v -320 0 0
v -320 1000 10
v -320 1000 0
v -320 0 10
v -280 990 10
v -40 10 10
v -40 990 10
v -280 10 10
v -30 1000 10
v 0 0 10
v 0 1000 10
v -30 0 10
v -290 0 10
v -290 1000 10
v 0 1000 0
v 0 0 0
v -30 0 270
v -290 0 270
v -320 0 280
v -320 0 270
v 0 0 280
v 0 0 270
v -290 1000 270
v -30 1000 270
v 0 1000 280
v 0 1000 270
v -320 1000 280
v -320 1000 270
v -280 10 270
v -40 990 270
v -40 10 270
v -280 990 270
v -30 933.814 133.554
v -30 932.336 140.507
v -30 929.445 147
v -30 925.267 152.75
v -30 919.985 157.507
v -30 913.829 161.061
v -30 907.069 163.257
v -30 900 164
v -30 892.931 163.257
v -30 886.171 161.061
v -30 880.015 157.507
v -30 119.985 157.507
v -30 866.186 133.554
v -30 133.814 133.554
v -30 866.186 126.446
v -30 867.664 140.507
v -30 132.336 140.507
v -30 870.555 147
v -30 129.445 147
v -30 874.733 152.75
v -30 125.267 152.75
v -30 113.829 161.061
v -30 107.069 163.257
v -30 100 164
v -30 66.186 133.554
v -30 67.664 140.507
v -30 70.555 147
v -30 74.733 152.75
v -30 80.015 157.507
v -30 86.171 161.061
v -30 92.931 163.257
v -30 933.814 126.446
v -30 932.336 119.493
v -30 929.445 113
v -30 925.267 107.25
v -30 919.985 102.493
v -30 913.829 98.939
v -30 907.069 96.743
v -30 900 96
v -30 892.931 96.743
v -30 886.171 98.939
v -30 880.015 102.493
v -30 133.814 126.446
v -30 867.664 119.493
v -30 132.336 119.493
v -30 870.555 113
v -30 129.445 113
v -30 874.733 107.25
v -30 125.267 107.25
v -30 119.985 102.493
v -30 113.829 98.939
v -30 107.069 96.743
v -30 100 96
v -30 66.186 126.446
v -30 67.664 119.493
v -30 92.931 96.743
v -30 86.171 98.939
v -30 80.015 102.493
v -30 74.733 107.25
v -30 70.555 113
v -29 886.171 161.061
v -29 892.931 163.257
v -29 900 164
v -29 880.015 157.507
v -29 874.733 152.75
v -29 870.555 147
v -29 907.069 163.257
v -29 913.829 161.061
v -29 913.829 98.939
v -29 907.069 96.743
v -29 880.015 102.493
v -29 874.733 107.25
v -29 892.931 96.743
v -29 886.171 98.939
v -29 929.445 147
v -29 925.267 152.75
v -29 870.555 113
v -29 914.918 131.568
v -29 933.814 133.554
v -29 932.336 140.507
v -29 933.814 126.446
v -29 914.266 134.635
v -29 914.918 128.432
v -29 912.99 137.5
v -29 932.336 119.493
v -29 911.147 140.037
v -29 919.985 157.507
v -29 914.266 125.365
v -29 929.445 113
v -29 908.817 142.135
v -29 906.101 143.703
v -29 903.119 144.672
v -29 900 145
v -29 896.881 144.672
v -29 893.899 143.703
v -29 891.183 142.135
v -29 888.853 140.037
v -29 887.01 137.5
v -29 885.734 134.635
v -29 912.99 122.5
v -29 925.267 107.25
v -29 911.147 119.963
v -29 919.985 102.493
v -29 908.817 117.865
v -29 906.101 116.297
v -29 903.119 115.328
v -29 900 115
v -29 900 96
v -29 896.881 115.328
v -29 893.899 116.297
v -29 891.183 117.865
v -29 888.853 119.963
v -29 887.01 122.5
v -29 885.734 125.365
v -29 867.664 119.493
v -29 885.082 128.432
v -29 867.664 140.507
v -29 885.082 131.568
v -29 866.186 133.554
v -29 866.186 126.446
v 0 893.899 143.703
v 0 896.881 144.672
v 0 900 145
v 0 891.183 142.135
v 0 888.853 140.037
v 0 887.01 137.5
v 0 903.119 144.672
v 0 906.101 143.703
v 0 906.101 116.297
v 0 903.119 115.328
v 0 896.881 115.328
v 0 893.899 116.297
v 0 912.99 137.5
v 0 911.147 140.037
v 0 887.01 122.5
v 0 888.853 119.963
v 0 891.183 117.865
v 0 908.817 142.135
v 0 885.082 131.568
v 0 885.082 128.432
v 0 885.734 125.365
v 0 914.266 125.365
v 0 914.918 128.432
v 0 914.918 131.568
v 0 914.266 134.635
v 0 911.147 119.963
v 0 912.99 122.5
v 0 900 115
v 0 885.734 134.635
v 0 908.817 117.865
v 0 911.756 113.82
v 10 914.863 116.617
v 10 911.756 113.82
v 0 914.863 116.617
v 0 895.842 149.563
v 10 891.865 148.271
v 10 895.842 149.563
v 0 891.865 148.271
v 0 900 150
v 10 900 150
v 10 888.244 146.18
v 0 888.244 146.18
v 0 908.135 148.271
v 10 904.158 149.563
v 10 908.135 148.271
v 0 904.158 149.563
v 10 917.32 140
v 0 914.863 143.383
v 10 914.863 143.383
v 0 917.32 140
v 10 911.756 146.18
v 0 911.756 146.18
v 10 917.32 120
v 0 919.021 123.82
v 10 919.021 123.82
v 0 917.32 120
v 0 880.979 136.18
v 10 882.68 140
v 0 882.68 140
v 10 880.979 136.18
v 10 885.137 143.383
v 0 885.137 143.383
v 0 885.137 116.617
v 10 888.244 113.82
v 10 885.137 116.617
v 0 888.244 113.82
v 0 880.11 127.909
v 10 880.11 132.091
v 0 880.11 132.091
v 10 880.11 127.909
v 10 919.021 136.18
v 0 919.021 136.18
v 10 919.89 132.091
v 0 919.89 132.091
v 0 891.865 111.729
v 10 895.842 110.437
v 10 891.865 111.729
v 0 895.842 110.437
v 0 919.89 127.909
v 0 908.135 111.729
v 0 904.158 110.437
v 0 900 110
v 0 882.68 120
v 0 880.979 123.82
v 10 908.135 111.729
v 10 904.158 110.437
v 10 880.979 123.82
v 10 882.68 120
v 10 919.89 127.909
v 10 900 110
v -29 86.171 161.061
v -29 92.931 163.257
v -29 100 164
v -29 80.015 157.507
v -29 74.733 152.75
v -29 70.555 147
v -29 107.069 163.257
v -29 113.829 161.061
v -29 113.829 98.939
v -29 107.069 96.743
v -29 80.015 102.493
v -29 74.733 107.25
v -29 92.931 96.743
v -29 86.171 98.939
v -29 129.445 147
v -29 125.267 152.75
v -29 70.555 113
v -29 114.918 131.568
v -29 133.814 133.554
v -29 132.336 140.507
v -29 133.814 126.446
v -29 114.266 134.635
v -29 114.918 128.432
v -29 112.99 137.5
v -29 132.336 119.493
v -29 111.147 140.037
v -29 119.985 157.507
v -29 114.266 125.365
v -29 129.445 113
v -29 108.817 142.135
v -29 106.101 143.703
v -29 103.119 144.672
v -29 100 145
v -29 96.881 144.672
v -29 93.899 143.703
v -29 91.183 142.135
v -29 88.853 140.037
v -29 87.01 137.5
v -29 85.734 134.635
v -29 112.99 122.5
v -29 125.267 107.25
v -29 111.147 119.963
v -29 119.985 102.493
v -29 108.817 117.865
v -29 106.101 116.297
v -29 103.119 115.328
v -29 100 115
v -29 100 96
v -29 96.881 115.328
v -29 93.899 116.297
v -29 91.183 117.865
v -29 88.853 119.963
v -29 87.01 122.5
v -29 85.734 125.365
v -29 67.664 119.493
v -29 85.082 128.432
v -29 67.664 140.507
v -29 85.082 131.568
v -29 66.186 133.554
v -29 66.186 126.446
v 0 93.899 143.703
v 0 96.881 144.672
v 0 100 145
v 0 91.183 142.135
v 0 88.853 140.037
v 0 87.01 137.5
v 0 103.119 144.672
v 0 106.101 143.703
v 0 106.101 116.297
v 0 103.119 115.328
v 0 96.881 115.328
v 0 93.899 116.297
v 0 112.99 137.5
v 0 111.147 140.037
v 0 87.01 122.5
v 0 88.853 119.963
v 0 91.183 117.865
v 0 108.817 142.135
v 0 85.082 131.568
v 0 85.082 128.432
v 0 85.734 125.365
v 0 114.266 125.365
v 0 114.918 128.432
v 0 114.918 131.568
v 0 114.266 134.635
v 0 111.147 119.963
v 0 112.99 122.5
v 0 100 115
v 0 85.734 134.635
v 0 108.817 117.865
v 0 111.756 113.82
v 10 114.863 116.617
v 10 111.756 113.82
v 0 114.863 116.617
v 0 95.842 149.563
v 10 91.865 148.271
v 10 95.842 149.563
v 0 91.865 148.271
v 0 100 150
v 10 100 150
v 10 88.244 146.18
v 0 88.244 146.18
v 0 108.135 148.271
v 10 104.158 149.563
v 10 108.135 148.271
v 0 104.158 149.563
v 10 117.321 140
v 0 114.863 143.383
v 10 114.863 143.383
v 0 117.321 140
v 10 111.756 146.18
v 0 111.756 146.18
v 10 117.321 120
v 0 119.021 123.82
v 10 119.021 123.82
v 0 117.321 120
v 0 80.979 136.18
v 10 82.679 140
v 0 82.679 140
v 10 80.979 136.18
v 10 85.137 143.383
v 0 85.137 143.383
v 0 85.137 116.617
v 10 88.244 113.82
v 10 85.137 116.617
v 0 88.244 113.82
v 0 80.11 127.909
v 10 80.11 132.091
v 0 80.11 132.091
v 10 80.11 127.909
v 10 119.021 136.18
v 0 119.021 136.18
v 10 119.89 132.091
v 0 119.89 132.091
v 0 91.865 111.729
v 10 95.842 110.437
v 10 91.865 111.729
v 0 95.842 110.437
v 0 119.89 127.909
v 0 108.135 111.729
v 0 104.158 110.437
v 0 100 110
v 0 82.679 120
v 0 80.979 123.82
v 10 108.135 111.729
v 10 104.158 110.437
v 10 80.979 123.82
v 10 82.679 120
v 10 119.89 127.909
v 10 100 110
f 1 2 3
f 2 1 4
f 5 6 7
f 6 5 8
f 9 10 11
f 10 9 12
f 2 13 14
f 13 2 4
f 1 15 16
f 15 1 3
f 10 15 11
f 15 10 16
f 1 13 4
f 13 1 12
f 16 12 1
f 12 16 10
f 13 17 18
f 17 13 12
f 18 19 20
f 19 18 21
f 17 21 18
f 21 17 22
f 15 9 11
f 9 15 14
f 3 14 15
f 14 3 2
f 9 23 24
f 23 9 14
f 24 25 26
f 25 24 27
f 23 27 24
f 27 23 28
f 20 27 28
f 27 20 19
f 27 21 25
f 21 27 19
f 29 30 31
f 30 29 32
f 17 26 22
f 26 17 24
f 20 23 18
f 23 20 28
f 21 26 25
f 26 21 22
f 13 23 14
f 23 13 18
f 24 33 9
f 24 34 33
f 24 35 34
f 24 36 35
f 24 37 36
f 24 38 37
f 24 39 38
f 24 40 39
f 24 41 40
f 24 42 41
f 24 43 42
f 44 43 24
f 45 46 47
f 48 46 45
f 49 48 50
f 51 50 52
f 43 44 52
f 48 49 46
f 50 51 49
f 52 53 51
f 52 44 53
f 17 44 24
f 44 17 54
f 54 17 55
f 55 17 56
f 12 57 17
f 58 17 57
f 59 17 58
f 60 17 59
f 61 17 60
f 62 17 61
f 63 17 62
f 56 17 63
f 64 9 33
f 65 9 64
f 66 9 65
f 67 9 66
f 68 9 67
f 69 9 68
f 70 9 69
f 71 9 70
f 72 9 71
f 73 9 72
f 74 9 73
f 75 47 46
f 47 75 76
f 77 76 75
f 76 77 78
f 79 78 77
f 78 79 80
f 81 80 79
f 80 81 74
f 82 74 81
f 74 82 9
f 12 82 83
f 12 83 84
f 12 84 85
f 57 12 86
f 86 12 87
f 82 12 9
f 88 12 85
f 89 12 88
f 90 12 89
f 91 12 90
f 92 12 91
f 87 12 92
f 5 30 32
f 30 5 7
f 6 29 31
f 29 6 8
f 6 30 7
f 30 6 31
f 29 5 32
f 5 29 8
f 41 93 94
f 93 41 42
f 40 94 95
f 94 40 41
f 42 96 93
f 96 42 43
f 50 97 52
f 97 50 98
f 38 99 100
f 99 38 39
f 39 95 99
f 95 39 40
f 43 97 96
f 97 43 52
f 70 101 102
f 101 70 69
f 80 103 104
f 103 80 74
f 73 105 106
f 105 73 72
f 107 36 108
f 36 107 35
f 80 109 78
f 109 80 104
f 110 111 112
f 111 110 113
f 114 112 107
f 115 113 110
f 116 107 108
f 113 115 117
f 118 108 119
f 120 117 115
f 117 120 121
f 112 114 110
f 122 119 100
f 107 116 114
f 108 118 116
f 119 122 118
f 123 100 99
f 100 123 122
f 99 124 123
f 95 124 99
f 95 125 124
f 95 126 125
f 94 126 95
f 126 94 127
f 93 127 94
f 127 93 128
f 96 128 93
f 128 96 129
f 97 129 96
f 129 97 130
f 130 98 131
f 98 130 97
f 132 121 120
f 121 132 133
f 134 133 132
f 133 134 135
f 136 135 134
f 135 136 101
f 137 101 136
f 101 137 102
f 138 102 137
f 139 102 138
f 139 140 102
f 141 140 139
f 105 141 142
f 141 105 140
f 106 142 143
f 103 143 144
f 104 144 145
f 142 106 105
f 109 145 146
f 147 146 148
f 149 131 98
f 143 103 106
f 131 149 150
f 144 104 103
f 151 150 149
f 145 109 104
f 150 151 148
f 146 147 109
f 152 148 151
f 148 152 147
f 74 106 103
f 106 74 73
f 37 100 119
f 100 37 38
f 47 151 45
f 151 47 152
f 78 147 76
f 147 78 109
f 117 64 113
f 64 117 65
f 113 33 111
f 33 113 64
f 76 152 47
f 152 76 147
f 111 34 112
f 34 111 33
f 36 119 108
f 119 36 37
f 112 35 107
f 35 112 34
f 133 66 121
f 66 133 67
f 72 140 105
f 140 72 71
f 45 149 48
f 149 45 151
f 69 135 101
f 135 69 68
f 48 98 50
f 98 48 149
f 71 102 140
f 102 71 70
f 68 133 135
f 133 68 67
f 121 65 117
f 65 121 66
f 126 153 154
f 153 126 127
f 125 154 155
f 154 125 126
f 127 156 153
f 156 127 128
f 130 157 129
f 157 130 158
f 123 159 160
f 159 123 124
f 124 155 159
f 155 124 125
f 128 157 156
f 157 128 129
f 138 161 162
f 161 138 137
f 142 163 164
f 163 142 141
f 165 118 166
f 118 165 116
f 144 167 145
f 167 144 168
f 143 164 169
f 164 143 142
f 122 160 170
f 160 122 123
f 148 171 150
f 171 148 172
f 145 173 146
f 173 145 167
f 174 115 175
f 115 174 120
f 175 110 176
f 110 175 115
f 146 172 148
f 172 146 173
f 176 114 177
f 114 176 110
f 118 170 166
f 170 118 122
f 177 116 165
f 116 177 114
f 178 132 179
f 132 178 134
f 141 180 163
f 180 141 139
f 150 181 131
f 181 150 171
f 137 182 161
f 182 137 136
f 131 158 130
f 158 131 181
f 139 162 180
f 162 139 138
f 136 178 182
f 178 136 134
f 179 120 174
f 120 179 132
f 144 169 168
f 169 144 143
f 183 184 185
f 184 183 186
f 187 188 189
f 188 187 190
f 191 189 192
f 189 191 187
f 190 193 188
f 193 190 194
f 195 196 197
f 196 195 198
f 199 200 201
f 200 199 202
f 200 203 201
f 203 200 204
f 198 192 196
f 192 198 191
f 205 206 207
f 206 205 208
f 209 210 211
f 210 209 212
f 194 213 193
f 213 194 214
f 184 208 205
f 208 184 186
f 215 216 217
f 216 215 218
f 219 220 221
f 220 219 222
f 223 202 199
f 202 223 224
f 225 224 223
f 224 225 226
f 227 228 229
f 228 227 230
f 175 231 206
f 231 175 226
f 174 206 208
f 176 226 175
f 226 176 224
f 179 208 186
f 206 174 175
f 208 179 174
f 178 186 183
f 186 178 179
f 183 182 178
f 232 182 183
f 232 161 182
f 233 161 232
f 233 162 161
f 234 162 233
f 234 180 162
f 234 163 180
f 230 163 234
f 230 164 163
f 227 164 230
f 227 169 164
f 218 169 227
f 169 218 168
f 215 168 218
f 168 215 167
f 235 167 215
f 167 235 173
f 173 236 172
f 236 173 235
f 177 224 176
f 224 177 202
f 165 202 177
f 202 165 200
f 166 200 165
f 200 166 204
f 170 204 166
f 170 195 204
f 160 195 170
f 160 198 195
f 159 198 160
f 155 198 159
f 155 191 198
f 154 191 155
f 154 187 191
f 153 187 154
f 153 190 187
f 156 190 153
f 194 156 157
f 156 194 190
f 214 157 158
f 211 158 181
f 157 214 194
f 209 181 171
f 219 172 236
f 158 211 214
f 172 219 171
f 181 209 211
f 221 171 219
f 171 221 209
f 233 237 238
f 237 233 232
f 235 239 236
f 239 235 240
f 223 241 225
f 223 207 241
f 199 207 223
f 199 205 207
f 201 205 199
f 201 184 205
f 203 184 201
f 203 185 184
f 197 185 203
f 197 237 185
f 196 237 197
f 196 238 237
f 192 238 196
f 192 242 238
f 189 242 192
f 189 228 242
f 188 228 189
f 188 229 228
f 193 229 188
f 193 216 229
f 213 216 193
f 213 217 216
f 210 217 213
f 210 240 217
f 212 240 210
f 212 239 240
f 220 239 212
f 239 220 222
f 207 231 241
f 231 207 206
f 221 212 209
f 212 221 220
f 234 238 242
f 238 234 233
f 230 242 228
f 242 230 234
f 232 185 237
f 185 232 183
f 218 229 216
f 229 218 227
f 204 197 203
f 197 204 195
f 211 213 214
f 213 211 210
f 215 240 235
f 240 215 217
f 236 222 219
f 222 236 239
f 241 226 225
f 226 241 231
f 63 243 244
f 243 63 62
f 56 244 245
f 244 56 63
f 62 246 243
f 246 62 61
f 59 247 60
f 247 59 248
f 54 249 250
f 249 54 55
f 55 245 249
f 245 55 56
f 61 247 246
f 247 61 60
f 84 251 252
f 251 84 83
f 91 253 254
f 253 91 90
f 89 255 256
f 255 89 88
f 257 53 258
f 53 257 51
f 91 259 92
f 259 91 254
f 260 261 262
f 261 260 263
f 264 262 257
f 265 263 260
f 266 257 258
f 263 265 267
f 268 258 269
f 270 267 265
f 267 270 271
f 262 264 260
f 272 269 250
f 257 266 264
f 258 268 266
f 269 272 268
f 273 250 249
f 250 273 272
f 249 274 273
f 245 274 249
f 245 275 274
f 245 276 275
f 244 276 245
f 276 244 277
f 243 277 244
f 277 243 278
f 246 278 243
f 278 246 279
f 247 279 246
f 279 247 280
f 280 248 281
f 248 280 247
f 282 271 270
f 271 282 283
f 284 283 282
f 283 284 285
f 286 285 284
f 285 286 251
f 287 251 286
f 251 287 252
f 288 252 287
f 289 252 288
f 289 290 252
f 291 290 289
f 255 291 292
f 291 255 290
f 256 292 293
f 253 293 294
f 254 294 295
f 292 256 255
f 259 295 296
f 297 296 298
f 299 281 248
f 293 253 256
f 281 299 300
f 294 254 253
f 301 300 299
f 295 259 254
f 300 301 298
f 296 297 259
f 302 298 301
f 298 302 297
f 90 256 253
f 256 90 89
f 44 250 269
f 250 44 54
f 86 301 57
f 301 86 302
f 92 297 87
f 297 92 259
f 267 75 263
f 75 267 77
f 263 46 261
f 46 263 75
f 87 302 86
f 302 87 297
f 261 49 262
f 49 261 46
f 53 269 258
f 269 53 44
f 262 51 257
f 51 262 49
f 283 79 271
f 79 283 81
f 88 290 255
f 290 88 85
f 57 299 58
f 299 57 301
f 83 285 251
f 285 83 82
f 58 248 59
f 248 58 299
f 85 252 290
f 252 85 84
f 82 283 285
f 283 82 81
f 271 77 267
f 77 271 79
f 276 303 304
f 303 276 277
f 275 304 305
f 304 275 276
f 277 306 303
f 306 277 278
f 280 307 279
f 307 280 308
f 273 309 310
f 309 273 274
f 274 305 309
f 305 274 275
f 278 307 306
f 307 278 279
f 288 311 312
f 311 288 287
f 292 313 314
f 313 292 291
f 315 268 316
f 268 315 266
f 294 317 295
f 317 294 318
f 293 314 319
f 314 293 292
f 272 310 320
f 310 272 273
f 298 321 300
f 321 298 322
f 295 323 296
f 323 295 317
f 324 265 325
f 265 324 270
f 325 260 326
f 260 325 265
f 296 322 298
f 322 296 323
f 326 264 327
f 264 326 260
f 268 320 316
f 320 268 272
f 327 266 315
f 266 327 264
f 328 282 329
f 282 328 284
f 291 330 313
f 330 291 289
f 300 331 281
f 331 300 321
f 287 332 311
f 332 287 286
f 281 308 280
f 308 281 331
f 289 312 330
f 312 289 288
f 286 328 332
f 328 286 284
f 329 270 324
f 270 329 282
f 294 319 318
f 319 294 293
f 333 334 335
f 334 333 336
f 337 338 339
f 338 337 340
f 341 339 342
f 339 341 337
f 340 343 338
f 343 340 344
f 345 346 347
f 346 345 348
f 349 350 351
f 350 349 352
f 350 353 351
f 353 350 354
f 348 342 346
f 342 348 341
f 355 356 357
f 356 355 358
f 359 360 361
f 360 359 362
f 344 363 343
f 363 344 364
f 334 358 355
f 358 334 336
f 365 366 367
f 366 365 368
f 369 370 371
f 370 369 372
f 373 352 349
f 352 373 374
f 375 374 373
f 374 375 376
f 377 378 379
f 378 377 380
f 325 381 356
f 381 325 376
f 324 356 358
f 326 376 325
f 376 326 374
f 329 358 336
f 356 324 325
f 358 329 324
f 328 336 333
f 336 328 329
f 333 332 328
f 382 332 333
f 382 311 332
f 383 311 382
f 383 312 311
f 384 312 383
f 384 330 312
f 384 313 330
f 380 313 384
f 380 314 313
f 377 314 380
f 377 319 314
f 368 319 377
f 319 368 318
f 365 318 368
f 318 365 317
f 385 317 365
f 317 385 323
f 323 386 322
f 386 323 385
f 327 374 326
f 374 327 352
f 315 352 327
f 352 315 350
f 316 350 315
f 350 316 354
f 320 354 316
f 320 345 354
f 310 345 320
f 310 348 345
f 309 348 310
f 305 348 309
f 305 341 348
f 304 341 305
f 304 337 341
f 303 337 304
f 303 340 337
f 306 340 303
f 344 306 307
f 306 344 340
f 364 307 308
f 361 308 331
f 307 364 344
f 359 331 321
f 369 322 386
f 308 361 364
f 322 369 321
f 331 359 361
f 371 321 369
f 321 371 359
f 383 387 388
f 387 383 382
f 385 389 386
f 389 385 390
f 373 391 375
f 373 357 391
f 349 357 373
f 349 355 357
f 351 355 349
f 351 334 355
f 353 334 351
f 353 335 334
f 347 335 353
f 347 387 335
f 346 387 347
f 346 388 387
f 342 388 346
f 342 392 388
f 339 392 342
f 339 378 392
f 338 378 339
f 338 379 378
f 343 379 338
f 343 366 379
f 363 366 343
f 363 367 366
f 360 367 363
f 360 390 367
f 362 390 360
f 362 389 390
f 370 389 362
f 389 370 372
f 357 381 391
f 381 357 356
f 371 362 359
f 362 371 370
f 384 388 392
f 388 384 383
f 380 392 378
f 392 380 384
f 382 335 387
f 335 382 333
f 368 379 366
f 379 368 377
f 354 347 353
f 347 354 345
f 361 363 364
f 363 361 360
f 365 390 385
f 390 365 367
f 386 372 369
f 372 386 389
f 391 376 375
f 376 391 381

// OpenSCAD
// file: emergencystop.scad
module emergencystop()
{
        color("yellow") cube([68, 68, 53]);
        color("red") translate([34, 34, 53]) cylinder(r=15, h=92-53-10);
        color("red") translate([34, 34, 82]) cylinder(r=20, h=10);
}


module emergencystop2()
{
        color("yellow") cylinder(r=34, h=1);
        color("red") translate([0, 0, 1]) cylinder(r=15, h=30);
        color("red") translate([0, 0, 30]) cylinder(r=20, h=10);
}

emergencystop2();
// main file
use <emergencystop.scad>

module box(depth, width, height, d)
{
        translate([0, width, 0])
        rotate([0, 0,180]) {
                color([200/255, 151/255, 95/255]) {
                        // bottom
                        cube([depth, width, d]);
                        echo("Box, : ", depth, "x", width);

                        // top
                        translate([0, 0, height+10])
                                cube([depth, width, d]);

                        echo("Box, : ", depth, "x", width);
                        
                        // left
                        translate([30, 0, 10])
                                cube([depth-2*30, d, height]);
                        echo("Box, : ", depth-2*30, "x", height);
                        
                        // right
                        translate([30, width-d, 10])
                                cube([depth-2*30, d, height]);
                        echo("Box, : ", depth-2*30, "x", height);

                        // back
                        translate([30, 10, 10])
                                cube([d, width - 2 * d, height]);
                        echo("Box, : ", width - 2 * d, "x", height);

                        // front
                        translate([depth-30-10, d, d])
                                cube([d, width - 2 * d, height]);                
                        echo("Box, : ", width - 2 * d, "x", height);

                }
                translate([30, 100, height/2])
                        rotate([0, -90, 0])
                        emergencystop2();

                translate([30, width-100, height/2])
                        rotate([0, -90, 0])
                        emergencystop2();
        }
}

box(320, 1000, 260, 10);
